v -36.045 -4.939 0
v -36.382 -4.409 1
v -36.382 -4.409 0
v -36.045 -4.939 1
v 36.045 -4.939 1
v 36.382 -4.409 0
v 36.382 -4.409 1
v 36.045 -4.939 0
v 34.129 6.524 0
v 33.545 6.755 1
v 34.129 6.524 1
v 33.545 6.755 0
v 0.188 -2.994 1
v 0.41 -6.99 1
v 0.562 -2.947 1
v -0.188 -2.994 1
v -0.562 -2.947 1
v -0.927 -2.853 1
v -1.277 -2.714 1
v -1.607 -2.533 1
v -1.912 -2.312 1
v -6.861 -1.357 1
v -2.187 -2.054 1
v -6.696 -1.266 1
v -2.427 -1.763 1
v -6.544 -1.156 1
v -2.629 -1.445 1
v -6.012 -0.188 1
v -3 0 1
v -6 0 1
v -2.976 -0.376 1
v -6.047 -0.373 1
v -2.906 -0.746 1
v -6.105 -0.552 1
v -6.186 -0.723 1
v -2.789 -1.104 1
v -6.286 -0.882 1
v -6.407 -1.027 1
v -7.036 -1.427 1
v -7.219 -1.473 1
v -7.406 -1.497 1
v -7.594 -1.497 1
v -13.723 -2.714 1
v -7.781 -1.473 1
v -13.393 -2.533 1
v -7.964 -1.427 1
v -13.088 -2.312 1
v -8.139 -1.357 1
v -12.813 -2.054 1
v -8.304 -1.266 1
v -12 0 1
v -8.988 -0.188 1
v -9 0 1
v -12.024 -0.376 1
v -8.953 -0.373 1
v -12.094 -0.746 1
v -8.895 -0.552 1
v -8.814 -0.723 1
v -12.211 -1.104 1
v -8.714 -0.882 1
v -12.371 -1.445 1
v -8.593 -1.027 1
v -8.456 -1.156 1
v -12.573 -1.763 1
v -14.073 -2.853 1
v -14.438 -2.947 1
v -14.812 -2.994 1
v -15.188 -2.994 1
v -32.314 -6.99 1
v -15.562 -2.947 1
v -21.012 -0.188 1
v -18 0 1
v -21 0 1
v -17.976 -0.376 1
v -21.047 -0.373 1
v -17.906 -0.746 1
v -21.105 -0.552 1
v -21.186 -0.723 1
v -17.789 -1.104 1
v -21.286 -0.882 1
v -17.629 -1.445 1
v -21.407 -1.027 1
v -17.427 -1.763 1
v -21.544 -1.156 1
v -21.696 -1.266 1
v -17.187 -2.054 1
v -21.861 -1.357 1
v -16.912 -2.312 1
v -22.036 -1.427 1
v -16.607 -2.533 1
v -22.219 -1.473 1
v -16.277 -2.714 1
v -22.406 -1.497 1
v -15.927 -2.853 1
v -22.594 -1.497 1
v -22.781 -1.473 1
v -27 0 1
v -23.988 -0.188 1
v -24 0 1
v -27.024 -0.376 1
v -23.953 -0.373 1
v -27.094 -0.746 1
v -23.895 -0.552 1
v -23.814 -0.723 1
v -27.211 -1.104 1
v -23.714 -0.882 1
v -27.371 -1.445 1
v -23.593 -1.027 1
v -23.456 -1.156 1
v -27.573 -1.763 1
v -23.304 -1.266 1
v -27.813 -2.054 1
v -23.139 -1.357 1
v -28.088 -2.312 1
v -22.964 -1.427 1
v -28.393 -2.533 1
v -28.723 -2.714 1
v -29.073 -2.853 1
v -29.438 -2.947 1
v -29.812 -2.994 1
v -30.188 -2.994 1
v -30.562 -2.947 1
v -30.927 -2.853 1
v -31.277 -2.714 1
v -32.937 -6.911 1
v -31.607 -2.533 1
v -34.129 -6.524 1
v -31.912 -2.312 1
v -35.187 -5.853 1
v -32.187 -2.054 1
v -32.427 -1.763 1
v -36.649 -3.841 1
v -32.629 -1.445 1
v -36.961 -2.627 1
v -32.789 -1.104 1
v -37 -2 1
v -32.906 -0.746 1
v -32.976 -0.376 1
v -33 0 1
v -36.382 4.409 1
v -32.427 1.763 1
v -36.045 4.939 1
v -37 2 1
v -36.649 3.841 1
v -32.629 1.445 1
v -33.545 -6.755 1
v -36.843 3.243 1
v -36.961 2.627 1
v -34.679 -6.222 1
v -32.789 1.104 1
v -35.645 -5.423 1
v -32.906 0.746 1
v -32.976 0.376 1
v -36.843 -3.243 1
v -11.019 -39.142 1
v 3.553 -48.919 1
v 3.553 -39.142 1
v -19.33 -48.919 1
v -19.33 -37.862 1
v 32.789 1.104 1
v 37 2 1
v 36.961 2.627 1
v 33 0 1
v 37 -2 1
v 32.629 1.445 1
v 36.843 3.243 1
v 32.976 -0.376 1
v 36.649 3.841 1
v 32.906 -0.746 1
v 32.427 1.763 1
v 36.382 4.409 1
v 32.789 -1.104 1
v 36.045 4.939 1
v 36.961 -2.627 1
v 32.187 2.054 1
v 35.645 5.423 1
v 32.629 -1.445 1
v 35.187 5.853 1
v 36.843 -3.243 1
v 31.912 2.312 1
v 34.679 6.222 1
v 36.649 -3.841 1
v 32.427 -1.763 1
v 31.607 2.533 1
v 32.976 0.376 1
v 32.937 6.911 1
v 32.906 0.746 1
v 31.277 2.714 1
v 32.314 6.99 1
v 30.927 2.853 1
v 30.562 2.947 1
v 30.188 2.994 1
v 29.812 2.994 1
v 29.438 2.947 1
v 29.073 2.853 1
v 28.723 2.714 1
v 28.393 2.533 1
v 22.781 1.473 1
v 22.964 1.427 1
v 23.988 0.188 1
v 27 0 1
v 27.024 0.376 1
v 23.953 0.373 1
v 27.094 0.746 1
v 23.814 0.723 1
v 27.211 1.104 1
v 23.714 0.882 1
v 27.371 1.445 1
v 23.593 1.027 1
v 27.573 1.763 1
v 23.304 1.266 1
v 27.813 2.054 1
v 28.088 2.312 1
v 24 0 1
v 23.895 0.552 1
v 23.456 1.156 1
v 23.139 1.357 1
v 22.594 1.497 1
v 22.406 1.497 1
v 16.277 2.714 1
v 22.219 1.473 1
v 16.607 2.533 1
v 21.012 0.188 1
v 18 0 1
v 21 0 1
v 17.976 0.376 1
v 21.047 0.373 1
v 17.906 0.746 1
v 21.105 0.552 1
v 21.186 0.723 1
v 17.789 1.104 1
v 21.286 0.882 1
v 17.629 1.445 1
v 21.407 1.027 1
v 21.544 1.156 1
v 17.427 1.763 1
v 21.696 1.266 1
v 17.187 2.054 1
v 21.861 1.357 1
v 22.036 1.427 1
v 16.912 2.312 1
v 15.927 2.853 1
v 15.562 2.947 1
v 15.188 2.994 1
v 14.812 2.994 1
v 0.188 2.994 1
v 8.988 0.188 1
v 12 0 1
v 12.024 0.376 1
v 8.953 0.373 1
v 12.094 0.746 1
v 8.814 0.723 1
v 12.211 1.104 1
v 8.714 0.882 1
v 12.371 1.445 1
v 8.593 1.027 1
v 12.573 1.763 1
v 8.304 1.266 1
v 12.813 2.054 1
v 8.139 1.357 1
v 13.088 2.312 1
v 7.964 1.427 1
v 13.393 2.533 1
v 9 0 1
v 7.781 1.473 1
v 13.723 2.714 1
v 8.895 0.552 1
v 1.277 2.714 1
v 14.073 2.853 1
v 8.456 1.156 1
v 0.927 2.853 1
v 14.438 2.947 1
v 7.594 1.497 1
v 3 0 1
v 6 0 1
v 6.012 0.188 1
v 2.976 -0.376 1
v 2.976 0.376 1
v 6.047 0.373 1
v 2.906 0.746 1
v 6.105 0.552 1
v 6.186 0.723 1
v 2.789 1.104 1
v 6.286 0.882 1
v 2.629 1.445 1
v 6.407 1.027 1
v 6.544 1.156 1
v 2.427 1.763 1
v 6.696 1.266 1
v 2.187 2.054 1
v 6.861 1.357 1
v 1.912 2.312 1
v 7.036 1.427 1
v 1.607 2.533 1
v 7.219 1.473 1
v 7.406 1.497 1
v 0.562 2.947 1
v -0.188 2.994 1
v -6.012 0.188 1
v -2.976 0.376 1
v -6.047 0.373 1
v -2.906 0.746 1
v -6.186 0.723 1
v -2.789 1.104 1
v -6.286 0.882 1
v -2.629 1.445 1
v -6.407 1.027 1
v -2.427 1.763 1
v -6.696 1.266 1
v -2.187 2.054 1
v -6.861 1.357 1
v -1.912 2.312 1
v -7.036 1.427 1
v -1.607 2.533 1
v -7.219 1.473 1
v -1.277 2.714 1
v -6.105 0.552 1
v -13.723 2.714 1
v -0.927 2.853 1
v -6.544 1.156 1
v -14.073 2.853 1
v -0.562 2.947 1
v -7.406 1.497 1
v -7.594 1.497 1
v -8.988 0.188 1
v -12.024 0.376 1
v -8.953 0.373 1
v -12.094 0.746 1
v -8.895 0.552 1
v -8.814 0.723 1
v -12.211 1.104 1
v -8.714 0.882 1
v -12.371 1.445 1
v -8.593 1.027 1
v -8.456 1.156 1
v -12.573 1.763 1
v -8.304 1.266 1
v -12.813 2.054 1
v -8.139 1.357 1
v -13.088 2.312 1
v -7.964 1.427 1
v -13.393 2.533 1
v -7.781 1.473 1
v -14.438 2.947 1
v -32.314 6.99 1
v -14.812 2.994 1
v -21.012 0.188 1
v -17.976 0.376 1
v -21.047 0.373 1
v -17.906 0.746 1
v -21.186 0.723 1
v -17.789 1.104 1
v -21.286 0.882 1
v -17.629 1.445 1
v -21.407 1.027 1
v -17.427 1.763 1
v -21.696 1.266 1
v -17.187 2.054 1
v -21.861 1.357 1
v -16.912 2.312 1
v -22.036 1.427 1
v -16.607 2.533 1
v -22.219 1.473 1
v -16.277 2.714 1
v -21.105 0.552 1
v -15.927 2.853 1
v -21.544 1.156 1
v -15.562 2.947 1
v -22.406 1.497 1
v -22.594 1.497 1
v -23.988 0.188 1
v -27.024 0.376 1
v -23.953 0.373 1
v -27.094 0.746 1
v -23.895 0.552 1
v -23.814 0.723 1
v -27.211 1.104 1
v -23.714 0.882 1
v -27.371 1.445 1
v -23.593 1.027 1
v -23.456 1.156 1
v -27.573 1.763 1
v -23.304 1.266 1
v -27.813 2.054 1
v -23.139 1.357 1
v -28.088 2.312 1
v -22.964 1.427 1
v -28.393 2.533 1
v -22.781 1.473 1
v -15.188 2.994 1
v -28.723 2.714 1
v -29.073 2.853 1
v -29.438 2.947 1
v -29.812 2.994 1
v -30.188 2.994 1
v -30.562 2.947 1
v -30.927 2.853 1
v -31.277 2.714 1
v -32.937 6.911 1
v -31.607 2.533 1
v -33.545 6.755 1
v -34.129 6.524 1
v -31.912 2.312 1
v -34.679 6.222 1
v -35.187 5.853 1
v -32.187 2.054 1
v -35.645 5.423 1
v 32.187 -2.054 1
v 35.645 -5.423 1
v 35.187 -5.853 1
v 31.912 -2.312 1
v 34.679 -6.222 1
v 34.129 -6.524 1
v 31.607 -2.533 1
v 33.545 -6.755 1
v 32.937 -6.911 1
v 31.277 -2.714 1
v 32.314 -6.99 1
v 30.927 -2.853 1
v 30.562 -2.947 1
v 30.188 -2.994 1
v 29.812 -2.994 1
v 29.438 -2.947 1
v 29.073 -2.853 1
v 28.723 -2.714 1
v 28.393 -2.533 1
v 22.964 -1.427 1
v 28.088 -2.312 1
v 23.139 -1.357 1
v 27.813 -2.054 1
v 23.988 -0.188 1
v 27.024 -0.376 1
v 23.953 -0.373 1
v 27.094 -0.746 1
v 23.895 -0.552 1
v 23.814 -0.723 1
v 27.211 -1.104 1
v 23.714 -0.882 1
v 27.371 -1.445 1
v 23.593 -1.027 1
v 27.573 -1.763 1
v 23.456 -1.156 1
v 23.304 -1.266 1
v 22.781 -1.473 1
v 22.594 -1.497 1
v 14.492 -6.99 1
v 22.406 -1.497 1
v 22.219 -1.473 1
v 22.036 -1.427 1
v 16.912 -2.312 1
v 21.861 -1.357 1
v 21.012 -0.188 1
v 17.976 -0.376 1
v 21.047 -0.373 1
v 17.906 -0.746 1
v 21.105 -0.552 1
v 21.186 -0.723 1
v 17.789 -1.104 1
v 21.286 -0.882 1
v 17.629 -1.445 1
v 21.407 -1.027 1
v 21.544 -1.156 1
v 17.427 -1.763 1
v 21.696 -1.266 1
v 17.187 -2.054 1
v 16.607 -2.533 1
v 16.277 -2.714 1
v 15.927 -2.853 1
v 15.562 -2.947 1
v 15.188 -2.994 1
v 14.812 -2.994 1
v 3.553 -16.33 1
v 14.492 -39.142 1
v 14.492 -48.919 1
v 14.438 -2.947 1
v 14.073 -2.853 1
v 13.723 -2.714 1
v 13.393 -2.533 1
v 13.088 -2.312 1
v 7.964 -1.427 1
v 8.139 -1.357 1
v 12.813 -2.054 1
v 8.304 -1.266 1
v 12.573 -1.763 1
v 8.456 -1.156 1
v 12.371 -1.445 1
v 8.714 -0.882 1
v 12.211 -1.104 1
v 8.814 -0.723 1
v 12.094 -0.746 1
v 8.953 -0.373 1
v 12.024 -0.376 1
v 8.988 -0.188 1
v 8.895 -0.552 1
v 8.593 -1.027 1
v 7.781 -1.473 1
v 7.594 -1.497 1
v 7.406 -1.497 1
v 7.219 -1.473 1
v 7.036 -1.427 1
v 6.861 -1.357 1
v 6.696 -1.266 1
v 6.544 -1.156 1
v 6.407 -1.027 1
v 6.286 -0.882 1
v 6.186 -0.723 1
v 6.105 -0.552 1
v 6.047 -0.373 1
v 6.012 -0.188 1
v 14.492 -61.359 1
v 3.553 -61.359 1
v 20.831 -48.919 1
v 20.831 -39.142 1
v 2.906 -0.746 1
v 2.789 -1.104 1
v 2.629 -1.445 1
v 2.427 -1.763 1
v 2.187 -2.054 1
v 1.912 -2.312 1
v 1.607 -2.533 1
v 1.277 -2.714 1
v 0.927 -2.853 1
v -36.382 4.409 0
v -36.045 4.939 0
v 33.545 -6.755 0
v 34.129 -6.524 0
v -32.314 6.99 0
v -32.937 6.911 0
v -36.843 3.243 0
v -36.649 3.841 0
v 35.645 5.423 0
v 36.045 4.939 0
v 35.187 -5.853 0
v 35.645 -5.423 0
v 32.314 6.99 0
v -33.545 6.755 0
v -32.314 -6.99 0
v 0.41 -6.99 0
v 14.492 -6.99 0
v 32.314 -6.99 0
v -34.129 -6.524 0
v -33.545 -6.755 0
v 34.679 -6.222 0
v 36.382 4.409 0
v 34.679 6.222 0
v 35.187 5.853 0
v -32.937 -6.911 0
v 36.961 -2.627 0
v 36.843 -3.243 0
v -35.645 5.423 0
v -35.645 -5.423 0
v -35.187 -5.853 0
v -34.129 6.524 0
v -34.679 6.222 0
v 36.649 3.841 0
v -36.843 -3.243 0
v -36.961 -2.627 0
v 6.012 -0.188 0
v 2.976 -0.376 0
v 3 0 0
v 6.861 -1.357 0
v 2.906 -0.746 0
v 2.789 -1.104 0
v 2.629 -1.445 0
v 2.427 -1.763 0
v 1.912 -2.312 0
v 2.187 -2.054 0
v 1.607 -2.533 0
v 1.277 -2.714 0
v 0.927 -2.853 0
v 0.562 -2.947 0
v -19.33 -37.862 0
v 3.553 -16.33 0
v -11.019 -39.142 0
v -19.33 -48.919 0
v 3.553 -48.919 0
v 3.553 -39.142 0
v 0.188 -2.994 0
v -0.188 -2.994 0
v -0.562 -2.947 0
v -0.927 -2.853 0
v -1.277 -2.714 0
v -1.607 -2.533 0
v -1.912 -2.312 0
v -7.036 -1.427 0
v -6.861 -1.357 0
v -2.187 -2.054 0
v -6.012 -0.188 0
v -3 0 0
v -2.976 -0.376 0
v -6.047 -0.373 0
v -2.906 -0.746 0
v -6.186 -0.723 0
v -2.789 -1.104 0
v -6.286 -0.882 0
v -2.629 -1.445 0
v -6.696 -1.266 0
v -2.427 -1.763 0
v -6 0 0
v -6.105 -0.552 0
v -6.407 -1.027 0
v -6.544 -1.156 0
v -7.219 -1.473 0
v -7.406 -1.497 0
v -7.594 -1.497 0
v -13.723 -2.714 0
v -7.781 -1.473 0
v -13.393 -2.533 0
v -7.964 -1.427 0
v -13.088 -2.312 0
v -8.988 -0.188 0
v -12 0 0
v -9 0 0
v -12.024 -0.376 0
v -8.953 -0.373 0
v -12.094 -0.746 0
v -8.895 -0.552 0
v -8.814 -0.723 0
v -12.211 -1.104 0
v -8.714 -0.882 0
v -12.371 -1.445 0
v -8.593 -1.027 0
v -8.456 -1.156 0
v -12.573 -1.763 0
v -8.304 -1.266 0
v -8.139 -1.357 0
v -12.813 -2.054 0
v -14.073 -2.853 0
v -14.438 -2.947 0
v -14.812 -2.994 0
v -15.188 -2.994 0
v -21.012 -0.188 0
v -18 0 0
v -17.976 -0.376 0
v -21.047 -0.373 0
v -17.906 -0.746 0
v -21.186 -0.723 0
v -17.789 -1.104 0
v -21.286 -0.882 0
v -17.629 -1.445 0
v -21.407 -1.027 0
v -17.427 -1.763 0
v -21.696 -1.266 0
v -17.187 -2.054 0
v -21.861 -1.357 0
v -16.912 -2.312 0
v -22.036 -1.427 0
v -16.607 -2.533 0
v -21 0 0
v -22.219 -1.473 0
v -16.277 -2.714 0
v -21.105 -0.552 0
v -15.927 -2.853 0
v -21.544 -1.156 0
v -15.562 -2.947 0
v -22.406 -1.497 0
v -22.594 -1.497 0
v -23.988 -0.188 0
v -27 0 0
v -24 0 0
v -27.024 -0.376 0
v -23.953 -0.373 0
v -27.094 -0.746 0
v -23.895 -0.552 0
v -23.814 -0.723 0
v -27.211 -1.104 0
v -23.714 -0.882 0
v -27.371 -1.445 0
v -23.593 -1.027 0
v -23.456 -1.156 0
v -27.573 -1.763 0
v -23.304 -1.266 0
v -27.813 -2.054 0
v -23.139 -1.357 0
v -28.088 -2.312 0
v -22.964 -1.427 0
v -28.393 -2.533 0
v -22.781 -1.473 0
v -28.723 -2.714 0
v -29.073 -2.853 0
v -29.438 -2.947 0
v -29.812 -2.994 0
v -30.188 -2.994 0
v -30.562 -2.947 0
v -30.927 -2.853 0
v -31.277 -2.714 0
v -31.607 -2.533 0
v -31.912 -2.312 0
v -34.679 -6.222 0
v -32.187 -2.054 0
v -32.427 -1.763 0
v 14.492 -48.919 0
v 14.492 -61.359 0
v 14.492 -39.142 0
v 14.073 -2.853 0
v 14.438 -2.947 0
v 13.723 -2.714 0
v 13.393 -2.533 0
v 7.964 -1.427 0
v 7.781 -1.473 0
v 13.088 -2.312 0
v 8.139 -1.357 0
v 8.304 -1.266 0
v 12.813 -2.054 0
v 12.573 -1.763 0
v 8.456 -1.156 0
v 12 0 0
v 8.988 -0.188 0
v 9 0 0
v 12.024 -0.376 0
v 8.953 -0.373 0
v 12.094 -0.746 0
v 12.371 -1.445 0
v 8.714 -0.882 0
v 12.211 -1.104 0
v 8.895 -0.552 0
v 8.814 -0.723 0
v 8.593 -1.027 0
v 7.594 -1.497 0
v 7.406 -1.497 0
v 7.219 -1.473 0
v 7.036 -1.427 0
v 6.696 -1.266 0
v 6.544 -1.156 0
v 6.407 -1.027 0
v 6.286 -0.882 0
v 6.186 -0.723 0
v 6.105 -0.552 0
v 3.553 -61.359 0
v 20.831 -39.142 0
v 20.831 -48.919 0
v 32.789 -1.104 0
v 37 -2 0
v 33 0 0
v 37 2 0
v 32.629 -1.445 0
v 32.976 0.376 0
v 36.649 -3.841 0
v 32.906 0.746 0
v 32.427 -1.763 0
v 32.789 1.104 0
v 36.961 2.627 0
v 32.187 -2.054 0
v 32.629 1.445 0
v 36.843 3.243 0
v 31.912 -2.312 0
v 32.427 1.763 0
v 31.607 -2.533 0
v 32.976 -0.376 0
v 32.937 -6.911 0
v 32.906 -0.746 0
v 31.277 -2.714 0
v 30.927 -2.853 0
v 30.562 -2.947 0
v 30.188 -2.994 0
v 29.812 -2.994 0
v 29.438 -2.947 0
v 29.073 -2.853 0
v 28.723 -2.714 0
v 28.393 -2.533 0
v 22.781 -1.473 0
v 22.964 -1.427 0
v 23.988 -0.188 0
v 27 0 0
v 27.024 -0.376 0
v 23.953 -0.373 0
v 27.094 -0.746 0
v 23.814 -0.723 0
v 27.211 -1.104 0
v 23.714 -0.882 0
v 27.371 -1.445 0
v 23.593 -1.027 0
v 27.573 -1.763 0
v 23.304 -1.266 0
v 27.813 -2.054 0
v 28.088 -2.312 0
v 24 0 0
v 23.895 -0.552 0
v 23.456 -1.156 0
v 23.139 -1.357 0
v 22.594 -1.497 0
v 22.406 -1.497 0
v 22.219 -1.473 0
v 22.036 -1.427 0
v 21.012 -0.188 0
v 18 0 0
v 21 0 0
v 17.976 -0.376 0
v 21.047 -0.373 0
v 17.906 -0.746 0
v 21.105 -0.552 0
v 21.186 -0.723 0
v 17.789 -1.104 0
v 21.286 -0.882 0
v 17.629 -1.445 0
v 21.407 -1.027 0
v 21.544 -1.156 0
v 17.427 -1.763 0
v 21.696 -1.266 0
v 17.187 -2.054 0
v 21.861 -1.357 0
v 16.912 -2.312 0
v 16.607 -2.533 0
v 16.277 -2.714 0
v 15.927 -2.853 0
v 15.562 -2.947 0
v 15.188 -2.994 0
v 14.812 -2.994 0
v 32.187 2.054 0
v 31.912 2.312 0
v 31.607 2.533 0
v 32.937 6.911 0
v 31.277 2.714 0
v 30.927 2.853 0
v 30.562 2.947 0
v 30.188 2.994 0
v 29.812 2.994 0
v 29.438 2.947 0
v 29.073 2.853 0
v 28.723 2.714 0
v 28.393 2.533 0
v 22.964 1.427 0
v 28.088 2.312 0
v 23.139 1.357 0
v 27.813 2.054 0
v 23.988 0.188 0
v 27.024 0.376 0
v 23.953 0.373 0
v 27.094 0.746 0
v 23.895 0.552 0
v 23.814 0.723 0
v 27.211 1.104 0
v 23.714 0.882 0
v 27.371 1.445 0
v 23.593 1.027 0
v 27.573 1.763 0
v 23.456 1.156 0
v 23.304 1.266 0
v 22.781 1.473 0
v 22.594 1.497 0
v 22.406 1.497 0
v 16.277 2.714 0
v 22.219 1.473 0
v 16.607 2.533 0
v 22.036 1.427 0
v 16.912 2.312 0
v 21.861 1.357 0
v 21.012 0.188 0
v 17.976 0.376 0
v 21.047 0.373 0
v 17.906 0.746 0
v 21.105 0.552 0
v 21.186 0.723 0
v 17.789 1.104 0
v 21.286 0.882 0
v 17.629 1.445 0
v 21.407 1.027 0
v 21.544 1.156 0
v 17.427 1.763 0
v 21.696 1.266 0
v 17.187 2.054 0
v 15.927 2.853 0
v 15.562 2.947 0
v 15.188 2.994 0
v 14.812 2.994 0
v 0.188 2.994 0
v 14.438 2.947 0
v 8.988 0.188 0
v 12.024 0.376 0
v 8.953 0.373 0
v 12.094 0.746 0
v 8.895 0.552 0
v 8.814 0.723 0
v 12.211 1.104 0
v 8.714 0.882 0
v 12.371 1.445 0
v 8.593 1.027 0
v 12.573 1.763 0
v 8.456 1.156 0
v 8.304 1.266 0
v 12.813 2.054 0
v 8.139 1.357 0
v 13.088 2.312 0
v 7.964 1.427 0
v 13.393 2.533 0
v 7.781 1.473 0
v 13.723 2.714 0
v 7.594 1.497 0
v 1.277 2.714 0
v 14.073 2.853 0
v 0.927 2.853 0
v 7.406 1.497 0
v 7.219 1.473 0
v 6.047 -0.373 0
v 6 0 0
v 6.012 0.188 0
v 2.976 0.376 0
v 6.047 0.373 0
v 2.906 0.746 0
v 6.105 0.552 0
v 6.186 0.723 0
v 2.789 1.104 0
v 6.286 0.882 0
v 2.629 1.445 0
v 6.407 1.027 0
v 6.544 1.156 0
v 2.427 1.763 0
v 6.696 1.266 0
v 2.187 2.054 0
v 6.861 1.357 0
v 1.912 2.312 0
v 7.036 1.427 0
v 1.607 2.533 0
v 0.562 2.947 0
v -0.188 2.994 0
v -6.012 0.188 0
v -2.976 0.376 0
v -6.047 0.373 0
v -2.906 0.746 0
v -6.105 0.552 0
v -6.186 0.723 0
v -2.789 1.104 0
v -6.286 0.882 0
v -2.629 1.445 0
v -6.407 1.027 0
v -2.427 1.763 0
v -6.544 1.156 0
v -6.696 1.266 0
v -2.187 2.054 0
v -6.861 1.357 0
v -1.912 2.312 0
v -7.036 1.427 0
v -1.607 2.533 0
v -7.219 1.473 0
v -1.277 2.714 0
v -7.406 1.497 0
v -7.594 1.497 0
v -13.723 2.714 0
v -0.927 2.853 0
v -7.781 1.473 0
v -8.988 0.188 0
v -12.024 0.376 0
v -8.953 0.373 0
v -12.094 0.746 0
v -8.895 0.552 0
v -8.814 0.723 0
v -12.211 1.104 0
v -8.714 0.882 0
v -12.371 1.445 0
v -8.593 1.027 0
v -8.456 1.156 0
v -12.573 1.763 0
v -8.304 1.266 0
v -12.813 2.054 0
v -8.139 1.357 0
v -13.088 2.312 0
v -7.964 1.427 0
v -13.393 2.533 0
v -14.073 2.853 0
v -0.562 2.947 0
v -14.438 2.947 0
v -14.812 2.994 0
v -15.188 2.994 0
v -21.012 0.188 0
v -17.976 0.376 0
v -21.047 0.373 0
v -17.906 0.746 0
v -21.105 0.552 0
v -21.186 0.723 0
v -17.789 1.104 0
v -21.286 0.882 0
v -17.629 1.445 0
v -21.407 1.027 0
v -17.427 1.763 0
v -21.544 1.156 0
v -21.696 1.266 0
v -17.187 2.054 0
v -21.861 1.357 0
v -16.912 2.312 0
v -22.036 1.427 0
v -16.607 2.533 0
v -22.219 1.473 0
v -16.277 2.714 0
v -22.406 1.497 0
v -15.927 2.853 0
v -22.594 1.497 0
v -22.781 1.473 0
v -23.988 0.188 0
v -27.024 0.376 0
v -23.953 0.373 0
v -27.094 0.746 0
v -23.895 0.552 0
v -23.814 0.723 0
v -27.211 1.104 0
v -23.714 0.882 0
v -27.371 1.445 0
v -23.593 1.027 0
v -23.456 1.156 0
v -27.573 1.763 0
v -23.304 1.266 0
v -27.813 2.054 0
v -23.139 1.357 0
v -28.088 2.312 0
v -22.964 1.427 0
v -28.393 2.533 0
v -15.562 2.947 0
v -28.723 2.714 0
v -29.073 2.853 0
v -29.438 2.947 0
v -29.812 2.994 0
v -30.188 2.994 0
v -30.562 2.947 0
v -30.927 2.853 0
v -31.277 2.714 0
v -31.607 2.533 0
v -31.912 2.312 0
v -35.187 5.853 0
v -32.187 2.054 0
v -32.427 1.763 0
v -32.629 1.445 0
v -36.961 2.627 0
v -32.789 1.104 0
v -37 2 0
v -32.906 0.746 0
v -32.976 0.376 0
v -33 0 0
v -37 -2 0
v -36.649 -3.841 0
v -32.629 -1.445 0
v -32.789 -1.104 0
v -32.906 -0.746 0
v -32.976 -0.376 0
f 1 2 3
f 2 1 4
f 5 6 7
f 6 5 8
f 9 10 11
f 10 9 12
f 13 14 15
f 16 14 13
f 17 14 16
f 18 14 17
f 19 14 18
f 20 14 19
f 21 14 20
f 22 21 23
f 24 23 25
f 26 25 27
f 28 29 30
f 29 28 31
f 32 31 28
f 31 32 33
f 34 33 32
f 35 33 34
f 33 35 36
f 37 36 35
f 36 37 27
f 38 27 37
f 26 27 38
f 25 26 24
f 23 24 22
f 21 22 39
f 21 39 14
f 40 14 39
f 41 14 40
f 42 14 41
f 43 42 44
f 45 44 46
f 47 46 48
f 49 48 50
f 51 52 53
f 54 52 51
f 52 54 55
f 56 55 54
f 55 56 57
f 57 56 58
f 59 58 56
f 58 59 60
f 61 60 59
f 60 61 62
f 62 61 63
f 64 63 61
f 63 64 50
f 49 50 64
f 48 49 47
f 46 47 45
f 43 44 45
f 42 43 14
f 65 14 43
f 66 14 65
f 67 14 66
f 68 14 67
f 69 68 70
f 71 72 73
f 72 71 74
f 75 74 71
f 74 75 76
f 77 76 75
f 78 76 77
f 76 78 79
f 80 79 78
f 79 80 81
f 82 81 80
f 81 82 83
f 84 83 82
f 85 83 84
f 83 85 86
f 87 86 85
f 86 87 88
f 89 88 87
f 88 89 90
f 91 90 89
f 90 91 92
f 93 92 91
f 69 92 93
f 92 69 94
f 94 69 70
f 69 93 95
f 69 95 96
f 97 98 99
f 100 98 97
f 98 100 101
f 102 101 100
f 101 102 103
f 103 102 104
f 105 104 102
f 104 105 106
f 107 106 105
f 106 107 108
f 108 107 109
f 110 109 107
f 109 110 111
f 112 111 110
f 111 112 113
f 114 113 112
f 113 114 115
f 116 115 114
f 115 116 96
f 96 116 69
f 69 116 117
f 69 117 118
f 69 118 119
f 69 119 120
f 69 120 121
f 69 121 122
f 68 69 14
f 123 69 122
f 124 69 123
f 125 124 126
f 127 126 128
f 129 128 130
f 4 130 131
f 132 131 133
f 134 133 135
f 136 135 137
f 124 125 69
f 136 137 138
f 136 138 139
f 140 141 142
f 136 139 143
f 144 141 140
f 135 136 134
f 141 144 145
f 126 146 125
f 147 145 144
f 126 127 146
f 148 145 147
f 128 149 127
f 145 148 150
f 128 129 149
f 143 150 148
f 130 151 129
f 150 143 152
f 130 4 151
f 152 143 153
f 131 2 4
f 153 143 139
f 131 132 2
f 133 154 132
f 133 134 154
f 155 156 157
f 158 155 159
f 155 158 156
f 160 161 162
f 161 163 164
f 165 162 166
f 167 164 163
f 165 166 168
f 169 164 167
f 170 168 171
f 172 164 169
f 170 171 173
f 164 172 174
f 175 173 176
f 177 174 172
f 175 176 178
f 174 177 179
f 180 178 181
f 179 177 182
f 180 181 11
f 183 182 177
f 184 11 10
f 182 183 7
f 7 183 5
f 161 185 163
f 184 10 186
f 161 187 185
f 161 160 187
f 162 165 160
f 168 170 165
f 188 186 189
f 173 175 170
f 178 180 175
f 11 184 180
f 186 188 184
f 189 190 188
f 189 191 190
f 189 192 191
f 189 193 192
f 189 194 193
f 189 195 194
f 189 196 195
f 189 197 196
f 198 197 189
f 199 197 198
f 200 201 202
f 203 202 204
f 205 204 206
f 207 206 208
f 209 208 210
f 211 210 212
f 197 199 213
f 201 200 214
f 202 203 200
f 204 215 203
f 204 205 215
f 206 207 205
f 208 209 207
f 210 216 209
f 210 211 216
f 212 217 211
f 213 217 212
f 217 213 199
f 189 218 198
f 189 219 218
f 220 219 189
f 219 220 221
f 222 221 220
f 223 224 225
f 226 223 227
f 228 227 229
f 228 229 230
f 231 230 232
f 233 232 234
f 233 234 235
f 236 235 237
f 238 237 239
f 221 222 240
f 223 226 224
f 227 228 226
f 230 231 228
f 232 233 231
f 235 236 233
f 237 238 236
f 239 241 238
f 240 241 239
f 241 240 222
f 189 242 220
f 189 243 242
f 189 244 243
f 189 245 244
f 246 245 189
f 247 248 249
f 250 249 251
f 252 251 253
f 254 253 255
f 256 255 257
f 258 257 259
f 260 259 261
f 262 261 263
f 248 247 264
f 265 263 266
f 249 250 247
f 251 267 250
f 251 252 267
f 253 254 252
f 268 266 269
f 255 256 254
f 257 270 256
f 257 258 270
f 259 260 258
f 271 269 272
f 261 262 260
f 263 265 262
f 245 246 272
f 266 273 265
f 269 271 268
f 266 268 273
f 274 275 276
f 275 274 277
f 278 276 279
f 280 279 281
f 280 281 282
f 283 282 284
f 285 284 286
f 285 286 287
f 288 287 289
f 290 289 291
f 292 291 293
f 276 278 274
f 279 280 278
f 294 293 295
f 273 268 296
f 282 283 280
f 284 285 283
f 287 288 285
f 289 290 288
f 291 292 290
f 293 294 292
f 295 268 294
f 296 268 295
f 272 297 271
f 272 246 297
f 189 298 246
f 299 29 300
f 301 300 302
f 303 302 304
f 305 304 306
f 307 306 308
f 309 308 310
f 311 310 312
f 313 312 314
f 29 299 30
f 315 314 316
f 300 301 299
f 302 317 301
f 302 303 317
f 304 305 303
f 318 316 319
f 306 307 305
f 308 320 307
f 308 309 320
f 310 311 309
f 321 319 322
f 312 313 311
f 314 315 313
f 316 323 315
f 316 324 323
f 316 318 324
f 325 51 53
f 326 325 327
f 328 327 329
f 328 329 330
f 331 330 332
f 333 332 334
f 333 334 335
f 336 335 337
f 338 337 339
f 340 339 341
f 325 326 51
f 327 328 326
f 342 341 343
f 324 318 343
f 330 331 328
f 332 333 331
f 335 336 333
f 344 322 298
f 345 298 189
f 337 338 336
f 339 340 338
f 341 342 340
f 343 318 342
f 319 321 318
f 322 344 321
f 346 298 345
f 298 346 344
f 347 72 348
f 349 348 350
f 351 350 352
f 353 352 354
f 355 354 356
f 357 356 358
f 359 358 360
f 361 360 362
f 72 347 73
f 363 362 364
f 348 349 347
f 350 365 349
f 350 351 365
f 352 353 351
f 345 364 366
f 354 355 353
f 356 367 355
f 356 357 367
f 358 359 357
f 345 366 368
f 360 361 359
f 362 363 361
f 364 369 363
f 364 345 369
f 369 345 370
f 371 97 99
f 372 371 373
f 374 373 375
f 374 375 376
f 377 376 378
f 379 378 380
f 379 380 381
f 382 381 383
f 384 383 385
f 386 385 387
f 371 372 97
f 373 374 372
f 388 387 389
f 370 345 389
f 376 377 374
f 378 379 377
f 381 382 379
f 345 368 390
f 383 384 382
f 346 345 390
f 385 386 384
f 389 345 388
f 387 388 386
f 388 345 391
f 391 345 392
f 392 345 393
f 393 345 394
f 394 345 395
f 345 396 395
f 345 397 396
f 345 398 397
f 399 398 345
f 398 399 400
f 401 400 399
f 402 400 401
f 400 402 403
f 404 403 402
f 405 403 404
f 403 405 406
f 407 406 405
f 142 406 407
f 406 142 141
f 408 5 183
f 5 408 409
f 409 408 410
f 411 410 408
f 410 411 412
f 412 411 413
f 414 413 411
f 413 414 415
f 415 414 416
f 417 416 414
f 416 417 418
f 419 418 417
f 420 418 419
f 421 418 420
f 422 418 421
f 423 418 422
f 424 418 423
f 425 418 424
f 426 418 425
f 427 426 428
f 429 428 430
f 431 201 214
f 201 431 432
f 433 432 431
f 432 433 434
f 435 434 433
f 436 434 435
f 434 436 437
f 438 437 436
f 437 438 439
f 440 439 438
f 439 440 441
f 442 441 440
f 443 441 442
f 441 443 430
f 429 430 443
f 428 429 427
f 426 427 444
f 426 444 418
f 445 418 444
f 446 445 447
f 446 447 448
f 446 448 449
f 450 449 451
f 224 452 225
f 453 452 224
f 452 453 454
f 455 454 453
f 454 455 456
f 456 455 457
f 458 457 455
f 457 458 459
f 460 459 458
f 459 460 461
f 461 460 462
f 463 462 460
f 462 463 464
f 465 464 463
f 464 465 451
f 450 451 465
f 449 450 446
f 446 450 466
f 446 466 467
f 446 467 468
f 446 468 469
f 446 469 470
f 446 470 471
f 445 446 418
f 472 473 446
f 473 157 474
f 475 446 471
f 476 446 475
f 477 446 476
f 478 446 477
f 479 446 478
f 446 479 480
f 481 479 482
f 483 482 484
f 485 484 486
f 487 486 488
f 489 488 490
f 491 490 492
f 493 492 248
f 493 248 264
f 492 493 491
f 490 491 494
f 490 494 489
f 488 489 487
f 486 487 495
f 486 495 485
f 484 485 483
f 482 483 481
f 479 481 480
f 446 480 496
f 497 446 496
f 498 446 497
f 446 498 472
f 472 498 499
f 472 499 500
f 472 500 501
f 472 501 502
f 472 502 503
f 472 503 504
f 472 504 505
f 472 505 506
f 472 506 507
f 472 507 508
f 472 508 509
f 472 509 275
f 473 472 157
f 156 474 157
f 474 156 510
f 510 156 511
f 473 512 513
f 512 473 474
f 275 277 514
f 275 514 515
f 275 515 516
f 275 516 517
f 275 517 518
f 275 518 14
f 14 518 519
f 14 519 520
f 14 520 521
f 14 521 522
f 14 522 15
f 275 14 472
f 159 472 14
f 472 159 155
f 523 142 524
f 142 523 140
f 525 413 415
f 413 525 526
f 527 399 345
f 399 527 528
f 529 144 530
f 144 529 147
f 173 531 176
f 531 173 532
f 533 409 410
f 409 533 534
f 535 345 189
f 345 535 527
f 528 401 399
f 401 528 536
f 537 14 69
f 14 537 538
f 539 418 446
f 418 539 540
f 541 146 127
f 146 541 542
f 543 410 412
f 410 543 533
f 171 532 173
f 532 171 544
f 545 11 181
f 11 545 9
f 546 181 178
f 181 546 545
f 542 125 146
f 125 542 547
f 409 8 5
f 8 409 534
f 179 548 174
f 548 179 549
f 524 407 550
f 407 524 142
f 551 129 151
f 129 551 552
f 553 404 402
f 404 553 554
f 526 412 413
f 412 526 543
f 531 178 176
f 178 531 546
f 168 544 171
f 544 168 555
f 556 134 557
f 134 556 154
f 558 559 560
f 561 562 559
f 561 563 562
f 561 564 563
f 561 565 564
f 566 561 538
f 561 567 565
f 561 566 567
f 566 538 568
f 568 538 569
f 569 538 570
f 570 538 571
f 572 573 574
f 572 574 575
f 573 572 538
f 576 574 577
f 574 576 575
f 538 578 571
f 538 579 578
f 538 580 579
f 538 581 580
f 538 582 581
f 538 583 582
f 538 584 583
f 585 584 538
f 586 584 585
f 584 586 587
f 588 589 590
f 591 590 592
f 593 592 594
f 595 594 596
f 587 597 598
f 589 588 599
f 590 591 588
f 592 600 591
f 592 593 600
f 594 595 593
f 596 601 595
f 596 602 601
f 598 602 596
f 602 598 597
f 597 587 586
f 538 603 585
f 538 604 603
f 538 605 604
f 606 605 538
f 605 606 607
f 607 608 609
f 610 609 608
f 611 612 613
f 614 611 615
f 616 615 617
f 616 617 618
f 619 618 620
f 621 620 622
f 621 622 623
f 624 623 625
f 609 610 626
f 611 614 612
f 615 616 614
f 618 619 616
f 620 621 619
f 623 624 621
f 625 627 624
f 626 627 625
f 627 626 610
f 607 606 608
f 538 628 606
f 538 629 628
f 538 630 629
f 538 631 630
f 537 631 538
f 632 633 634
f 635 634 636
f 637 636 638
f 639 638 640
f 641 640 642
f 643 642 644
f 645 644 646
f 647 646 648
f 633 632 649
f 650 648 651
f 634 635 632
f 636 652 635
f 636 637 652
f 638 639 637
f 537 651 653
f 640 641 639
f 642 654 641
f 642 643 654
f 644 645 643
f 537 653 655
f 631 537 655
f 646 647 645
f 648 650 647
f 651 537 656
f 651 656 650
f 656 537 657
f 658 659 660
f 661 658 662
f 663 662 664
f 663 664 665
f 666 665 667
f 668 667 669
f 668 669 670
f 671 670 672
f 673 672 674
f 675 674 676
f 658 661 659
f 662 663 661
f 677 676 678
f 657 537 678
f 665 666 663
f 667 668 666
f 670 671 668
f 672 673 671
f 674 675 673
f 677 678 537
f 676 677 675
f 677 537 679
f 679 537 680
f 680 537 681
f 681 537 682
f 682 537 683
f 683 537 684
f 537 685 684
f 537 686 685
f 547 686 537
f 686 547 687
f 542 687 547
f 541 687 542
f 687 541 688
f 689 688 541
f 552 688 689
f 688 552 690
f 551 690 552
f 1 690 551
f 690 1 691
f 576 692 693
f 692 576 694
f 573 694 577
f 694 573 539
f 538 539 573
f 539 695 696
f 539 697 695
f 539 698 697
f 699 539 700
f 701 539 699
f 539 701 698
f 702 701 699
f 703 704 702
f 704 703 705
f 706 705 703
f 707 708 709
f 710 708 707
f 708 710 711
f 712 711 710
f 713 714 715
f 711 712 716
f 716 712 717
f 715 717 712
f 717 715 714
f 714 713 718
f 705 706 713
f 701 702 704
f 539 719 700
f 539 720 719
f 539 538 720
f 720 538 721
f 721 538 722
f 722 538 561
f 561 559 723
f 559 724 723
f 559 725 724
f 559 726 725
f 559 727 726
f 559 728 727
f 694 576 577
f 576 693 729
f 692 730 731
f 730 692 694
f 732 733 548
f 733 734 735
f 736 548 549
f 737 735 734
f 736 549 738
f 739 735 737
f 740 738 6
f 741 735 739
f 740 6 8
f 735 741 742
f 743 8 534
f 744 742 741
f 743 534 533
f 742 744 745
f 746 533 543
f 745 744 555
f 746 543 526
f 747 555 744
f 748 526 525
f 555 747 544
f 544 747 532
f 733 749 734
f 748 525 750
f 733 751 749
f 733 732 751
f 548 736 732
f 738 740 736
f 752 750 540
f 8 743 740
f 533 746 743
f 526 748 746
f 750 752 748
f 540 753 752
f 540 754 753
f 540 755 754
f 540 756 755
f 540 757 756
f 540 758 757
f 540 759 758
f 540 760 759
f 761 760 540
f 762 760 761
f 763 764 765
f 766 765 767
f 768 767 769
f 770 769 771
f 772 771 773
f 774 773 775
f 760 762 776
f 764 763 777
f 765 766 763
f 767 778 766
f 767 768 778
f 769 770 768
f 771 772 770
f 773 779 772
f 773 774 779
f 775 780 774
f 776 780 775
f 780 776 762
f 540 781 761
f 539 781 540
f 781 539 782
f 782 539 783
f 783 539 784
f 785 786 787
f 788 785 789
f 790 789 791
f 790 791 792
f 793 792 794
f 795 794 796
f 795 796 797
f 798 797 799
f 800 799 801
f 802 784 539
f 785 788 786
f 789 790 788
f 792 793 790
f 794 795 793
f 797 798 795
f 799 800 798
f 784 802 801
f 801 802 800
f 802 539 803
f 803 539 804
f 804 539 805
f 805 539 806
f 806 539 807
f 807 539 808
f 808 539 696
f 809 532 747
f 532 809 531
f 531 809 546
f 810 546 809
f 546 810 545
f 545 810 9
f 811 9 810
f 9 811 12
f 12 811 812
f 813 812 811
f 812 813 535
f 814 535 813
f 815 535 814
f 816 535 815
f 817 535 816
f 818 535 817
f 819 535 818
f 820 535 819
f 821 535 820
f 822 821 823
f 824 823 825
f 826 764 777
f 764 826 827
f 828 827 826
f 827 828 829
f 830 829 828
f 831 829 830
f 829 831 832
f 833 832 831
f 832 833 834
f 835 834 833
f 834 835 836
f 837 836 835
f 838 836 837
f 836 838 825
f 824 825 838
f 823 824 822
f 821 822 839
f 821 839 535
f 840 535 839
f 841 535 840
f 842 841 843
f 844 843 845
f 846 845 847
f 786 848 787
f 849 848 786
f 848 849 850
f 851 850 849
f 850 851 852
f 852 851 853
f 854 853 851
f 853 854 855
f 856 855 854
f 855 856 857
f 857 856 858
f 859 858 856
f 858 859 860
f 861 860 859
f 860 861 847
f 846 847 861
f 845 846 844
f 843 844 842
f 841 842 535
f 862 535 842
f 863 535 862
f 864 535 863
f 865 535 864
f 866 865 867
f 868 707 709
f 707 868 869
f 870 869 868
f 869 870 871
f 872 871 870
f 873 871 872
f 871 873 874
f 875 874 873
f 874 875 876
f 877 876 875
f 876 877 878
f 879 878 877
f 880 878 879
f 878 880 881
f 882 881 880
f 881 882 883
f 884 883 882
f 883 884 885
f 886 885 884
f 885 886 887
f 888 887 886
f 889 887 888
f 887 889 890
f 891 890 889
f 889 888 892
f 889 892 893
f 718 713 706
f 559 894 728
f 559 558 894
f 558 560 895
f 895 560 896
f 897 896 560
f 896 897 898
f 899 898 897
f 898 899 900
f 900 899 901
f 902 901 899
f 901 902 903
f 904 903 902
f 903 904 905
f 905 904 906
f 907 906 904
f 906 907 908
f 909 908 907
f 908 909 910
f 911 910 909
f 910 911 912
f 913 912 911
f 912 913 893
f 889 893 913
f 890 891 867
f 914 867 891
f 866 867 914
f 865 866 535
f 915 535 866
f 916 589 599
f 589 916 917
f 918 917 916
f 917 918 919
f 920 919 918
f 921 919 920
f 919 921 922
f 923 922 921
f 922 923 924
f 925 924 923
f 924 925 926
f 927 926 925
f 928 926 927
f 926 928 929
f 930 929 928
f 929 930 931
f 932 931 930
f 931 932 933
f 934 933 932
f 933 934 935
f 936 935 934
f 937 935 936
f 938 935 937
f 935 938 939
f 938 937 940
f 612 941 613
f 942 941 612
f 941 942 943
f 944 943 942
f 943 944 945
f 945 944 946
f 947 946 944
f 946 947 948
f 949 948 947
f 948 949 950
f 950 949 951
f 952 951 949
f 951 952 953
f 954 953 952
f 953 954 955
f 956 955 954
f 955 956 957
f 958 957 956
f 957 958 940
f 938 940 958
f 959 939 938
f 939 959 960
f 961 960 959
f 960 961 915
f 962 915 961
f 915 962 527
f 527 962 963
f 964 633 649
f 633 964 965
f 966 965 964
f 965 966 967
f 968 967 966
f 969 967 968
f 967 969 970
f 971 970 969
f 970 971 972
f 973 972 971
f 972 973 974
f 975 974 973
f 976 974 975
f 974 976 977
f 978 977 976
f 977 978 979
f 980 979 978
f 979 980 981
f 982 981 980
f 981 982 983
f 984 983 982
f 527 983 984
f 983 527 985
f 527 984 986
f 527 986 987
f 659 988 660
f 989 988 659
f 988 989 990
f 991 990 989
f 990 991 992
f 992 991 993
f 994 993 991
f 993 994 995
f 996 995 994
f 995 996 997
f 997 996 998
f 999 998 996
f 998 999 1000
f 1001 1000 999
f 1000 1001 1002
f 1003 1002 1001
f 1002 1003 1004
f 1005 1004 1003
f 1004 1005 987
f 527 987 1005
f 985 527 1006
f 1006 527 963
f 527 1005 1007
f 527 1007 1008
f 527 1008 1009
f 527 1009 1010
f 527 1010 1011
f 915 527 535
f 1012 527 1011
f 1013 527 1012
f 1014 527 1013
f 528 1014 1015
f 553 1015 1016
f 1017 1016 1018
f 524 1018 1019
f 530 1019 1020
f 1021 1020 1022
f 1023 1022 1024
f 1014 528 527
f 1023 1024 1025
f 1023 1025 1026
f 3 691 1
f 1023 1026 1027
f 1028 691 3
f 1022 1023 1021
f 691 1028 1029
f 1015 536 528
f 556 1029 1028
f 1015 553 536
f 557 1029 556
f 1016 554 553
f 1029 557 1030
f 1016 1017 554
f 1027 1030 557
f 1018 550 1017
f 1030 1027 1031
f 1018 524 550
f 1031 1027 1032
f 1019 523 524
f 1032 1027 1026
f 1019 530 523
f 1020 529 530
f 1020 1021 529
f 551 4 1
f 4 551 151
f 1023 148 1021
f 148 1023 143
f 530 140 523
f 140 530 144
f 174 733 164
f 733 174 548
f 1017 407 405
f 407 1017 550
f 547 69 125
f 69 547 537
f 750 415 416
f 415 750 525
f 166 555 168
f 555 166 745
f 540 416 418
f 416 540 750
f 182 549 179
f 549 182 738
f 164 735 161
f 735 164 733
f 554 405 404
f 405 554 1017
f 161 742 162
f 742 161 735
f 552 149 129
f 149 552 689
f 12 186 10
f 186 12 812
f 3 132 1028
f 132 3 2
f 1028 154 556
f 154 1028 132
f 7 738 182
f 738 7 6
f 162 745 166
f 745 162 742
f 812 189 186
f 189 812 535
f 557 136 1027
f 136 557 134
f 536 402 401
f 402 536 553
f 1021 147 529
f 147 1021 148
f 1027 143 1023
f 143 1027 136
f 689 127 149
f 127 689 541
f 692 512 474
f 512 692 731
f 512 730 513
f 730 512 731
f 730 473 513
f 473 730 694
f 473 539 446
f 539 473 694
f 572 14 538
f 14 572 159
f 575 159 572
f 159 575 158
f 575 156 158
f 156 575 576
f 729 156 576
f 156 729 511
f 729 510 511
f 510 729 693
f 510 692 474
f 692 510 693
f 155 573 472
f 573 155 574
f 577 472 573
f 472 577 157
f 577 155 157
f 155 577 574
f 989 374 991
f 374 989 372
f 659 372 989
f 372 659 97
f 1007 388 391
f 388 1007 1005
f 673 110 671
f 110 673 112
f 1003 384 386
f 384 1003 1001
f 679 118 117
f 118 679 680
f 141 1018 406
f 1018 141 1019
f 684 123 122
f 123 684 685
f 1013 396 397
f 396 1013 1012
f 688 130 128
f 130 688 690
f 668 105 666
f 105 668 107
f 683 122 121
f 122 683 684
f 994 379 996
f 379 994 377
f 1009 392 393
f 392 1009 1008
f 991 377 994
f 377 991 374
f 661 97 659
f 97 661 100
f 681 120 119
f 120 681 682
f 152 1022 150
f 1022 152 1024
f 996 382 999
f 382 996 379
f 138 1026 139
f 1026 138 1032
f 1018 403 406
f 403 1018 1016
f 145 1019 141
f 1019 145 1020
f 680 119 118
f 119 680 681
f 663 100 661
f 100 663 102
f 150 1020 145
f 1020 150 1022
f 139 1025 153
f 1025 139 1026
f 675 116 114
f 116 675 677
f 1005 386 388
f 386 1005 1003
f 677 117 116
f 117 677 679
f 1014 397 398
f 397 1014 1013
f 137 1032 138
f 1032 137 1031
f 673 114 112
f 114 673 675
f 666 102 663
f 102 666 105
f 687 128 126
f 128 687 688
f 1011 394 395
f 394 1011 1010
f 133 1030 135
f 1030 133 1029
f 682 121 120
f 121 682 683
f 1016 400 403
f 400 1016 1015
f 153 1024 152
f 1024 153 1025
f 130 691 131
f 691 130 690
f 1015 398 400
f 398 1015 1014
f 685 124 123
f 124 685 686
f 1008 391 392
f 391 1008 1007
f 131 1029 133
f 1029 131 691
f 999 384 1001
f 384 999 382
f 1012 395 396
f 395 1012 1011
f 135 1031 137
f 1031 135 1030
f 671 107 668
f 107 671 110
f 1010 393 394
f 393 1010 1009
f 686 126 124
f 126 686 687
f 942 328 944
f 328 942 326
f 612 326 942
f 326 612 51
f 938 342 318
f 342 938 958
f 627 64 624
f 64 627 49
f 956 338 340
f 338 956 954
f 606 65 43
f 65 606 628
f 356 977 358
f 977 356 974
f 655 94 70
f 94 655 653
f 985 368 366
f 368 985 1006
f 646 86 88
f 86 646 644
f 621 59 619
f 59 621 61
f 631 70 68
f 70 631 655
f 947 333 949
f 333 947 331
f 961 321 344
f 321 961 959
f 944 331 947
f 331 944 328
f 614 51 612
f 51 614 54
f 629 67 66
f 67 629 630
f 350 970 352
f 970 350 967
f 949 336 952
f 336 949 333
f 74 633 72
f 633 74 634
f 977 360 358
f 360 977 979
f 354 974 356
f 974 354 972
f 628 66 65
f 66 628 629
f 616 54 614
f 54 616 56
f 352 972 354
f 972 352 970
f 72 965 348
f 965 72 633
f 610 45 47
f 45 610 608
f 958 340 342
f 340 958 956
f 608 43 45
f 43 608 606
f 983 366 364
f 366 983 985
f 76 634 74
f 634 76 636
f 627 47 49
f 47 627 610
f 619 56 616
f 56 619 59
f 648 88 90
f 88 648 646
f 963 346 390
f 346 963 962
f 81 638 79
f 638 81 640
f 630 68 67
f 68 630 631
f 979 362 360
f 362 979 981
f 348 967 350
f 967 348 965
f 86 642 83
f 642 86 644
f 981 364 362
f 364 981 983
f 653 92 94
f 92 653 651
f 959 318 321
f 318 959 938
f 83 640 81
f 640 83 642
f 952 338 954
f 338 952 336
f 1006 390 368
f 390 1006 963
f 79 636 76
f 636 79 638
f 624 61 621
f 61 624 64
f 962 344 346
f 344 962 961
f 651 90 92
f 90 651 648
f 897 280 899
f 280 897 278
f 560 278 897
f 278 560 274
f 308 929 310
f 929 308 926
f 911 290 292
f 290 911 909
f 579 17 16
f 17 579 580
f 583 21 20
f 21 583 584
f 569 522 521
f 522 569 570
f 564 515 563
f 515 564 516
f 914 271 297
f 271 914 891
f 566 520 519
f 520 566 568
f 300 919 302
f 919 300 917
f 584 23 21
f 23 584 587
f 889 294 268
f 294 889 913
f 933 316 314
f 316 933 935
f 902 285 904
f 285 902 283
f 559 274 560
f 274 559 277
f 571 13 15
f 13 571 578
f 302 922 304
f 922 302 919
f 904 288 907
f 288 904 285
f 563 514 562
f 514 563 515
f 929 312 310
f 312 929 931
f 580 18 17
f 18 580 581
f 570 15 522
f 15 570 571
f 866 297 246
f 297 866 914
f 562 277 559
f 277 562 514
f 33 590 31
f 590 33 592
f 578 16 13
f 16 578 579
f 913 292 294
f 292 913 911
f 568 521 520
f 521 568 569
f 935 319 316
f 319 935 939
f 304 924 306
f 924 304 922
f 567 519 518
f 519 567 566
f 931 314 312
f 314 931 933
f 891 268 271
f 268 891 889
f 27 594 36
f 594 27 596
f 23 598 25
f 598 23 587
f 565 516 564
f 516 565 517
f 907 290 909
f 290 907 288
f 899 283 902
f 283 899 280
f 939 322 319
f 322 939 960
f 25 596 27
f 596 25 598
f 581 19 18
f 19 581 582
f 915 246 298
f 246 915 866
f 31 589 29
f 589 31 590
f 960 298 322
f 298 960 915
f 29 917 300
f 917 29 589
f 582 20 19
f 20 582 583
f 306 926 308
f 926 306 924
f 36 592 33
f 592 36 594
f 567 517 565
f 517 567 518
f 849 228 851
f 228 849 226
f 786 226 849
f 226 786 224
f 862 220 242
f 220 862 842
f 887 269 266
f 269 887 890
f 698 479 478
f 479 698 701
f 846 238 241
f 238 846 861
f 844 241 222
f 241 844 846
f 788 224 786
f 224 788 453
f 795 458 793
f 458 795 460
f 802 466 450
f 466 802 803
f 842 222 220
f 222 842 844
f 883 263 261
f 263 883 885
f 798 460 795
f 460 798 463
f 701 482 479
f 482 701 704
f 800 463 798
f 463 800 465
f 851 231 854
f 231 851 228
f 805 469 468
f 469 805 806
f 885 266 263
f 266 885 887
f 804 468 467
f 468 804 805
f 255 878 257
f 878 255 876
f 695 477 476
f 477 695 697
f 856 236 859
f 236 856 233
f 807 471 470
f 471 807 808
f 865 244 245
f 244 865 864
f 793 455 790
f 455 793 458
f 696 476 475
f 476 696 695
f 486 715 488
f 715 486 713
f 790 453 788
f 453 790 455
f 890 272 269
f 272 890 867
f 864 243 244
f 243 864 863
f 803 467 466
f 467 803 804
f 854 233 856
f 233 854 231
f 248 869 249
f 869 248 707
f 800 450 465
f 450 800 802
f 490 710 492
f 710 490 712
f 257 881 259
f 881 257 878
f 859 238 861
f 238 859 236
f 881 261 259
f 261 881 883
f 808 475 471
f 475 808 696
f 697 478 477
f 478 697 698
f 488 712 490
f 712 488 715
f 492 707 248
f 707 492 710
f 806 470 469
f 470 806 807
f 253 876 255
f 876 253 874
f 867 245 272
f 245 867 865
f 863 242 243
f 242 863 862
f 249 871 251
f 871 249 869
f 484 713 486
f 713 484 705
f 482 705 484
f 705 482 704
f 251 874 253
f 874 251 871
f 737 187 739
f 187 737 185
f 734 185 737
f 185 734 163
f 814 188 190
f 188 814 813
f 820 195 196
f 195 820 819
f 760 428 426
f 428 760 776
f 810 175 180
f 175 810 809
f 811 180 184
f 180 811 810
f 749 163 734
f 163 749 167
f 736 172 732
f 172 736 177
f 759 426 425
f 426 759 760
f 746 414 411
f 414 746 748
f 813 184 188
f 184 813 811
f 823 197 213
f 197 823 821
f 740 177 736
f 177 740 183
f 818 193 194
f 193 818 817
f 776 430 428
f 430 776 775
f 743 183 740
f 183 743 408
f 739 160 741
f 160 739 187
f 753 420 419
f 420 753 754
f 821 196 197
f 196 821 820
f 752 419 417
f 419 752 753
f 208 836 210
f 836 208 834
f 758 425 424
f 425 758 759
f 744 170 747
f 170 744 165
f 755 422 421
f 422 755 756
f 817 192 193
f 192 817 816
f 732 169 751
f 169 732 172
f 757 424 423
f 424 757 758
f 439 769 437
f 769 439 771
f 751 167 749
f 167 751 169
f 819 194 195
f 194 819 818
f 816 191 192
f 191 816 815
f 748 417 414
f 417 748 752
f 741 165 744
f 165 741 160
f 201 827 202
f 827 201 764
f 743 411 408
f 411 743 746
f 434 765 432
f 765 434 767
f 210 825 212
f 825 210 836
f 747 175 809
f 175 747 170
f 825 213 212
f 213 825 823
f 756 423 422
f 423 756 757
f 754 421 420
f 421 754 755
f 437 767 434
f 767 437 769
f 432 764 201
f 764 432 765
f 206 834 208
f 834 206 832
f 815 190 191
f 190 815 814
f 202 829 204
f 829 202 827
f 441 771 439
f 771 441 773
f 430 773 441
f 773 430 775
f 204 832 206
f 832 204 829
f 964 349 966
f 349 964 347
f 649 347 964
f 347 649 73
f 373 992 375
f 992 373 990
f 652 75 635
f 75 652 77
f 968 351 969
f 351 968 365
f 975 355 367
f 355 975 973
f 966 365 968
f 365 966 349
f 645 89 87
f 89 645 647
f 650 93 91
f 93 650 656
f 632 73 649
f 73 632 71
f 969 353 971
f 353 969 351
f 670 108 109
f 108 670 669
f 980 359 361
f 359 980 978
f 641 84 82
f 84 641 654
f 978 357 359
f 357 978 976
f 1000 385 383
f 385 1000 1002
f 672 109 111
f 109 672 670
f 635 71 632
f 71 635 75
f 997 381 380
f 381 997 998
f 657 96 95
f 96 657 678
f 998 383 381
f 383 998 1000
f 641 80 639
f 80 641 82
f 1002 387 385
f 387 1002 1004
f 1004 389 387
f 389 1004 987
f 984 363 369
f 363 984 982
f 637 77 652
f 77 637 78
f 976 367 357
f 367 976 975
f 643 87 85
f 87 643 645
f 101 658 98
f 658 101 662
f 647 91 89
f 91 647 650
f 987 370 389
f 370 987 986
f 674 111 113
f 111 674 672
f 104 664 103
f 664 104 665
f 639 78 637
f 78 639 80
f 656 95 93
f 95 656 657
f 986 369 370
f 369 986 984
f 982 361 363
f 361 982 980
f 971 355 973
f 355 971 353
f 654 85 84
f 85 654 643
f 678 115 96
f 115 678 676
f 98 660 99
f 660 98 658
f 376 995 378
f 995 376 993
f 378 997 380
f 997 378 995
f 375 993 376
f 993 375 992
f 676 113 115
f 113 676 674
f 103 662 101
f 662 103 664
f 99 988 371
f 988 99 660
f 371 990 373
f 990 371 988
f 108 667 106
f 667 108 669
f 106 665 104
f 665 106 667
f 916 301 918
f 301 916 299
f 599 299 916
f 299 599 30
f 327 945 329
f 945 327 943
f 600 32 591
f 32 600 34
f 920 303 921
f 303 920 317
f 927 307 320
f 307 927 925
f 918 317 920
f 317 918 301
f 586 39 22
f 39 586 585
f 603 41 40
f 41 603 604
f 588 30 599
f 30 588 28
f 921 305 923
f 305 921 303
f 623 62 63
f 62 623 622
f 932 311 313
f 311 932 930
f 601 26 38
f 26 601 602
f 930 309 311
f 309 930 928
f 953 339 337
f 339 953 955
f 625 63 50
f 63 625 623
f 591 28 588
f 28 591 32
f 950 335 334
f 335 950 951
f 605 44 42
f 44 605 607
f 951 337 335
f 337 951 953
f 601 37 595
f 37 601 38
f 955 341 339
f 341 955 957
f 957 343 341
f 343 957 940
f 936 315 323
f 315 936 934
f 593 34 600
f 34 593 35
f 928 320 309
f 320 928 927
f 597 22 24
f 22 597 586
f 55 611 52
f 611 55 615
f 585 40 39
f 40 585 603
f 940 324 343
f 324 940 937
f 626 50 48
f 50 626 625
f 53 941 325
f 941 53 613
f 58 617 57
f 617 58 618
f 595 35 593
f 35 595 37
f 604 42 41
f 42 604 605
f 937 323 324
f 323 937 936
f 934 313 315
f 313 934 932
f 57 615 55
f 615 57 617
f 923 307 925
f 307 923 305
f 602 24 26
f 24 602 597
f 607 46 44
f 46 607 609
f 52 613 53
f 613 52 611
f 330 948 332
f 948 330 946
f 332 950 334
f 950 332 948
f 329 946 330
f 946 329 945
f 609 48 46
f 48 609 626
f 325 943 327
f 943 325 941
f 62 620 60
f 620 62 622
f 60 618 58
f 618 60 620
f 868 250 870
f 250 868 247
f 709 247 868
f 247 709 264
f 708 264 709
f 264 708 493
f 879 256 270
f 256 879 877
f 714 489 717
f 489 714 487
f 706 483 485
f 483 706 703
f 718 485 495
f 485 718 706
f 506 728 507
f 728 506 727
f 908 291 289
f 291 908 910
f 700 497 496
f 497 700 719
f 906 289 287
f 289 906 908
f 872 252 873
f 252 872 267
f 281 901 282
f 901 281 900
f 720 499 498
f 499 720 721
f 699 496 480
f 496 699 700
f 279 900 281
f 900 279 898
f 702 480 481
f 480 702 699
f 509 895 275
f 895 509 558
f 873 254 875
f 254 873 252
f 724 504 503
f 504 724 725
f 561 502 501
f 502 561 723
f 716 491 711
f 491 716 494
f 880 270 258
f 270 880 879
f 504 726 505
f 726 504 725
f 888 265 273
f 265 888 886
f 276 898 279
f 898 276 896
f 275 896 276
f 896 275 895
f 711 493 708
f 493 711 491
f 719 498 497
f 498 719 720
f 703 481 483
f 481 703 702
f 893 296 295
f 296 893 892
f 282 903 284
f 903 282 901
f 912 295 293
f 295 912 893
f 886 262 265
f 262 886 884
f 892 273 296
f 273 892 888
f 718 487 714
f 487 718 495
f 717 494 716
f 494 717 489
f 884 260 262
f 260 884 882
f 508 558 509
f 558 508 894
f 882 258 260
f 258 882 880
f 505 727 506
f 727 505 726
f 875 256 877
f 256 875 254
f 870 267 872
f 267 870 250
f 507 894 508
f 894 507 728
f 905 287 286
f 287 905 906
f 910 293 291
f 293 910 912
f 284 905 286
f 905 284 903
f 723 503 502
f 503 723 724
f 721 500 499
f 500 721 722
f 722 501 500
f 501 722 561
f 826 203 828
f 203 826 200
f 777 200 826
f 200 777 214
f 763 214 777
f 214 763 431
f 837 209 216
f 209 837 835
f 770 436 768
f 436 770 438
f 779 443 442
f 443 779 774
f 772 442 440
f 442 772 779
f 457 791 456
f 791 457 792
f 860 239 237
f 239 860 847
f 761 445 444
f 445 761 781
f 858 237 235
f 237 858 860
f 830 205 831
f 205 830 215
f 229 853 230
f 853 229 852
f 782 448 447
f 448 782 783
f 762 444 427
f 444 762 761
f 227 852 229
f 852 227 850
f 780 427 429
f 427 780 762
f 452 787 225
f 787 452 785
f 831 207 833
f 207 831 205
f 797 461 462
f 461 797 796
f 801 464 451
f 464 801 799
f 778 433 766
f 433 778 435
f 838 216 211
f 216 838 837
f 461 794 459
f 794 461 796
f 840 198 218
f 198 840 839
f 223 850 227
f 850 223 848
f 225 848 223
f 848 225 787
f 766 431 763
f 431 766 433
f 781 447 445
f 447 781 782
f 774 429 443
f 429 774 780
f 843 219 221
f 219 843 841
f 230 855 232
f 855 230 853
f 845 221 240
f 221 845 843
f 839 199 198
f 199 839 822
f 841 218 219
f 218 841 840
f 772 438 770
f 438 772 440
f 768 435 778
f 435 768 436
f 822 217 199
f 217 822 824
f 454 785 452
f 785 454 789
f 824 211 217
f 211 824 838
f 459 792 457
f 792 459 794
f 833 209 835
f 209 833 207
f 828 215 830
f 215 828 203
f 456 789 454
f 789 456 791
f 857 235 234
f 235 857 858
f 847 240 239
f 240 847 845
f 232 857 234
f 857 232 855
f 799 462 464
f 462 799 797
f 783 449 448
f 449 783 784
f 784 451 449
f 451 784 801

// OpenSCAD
$fn = 50;


difference() {
	union() {
		*color(alpha = 1.0000000000, c = "gray") {
			translate(v = [0, 14, 0]) {
				linear_extrude(height = 1) {
					text(font = "Arial:style=Bold", halign = "center", size = 4.5000000000, text = "COMMENT description oobb_plate_shape_p_type_1_depth_5_width_1_thickness_4_extra_oobb_size", valign = "center");
				}
			}
		}
		hull() {
			translate(v = [-32.0000000000, 2.0000000000, 0]) {
				cylinder(h = 1, r = 5);
			}
			translate(v = [32.0000000000, 2.0000000000, 0]) {
				cylinder(h = 1, r = 5);
			}
			translate(v = [-32.0000000000, -2.0000000000, 0]) {
				cylinder(h = 1, r = 5);
			}
			translate(v = [32.0000000000, -2.0000000000, 0]) {
				cylinder(h = 1, r = 5);
			}
		}
		translate(v = [0, -5, 0]) {
			linear_extrude(height = 1) {
				text(font = "DejaVu Sans Mono:style=Bold", halign = "center", size = 57.0000000000, text = "4", valign = "top");
			}
		}
	}
	union() {
		*color(alpha = 1.0000000000, c = "gray") {
			translate(v = [0, 14, 0]) {
				linear_extrude(height = 1) {
					text(font = "Arial:style=Bold", halign = "center", size = 4.5000000000, text = "COMMENT description oobb_holes_shape_n_type_5_width_1_thickness_4_extra_oobb_size_1_height_'all'_holes_true_both_holes", valign = "center");
				}
			}
		}
		translate(v = [-30.0000000000, 0.0000000000, 0]) {
			translate(v = [0, 0, -50]) {
				cylinder(h = 100, r = 3.0000000000);
			}
		}
		translate(v = [-15.0000000000, 0.0000000000, 0]) {
			translate(v = [0, 0, -50]) {
				cylinder(h = 100, r = 3.0000000000);
			}
		}
		translate(v = [0, 0, -50]) {
			cylinder(h = 100, r = 3.0000000000);
		}
		translate(v = [15.0000000000, 0.0000000000, 0]) {
			translate(v = [0, 0, -50]) {
				cylinder(h = 100, r = 3.0000000000);
			}
		}
		translate(v = [30.0000000000, 0.0000000000, 0]) {
			translate(v = [0, 0, -50]) {
				cylinder(h = 100, r = 3.0000000000);
			}
		}
		translate(v = [-30.0000000000, 0.0000000000, 0]) {
			translate(v = [0, 0, -50]) {
				cylinder(h = 100, r = 1.5000000000);
			}
		}
		translate(v = [-22.5000000000, 0.0000000000, 0]) {
			translate(v = [0, 0, -50]) {
				cylinder(h = 100, r = 1.5000000000);
			}
		}
		translate(v = [-15.0000000000, 0.0000000000, 0]) {
			translate(v = [0, 0, -50]) {
				cylinder(h = 100, r = 1.5000000000);
			}
		}
		translate(v = [-7.5000000000, 0.0000000000, 0]) {
			translate(v = [0, 0, -50]) {
				cylinder(h = 100, r = 1.5000000000);
			}
		}
		translate(v = [0, 0, -50]) {
			cylinder(h = 100, r = 1.5000000000);
		}
		translate(v = [7.5000000000, 0.0000000000, 0]) {
			translate(v = [0, 0, -50]) {
				cylinder(h = 100, r = 1.5000000000);
			}
		}
		translate(v = [15.0000000000, 0.0000000000, 0]) {
			translate(v = [0, 0, -50]) {
				cylinder(h = 100, r = 1.5000000000);
			}
		}
		translate(v = [22.5000000000, 0.0000000000, 0]) {
			translate(v = [0, 0, -50]) {
				cylinder(h = 100, r = 1.5000000000);
			}
		}
		translate(v = [30.0000000000, 0.0000000000, 0]) {
			translate(v = [0, 0, -50]) {
				cylinder(h = 100, r = 1.5000000000);
			}
		}
	}
}
